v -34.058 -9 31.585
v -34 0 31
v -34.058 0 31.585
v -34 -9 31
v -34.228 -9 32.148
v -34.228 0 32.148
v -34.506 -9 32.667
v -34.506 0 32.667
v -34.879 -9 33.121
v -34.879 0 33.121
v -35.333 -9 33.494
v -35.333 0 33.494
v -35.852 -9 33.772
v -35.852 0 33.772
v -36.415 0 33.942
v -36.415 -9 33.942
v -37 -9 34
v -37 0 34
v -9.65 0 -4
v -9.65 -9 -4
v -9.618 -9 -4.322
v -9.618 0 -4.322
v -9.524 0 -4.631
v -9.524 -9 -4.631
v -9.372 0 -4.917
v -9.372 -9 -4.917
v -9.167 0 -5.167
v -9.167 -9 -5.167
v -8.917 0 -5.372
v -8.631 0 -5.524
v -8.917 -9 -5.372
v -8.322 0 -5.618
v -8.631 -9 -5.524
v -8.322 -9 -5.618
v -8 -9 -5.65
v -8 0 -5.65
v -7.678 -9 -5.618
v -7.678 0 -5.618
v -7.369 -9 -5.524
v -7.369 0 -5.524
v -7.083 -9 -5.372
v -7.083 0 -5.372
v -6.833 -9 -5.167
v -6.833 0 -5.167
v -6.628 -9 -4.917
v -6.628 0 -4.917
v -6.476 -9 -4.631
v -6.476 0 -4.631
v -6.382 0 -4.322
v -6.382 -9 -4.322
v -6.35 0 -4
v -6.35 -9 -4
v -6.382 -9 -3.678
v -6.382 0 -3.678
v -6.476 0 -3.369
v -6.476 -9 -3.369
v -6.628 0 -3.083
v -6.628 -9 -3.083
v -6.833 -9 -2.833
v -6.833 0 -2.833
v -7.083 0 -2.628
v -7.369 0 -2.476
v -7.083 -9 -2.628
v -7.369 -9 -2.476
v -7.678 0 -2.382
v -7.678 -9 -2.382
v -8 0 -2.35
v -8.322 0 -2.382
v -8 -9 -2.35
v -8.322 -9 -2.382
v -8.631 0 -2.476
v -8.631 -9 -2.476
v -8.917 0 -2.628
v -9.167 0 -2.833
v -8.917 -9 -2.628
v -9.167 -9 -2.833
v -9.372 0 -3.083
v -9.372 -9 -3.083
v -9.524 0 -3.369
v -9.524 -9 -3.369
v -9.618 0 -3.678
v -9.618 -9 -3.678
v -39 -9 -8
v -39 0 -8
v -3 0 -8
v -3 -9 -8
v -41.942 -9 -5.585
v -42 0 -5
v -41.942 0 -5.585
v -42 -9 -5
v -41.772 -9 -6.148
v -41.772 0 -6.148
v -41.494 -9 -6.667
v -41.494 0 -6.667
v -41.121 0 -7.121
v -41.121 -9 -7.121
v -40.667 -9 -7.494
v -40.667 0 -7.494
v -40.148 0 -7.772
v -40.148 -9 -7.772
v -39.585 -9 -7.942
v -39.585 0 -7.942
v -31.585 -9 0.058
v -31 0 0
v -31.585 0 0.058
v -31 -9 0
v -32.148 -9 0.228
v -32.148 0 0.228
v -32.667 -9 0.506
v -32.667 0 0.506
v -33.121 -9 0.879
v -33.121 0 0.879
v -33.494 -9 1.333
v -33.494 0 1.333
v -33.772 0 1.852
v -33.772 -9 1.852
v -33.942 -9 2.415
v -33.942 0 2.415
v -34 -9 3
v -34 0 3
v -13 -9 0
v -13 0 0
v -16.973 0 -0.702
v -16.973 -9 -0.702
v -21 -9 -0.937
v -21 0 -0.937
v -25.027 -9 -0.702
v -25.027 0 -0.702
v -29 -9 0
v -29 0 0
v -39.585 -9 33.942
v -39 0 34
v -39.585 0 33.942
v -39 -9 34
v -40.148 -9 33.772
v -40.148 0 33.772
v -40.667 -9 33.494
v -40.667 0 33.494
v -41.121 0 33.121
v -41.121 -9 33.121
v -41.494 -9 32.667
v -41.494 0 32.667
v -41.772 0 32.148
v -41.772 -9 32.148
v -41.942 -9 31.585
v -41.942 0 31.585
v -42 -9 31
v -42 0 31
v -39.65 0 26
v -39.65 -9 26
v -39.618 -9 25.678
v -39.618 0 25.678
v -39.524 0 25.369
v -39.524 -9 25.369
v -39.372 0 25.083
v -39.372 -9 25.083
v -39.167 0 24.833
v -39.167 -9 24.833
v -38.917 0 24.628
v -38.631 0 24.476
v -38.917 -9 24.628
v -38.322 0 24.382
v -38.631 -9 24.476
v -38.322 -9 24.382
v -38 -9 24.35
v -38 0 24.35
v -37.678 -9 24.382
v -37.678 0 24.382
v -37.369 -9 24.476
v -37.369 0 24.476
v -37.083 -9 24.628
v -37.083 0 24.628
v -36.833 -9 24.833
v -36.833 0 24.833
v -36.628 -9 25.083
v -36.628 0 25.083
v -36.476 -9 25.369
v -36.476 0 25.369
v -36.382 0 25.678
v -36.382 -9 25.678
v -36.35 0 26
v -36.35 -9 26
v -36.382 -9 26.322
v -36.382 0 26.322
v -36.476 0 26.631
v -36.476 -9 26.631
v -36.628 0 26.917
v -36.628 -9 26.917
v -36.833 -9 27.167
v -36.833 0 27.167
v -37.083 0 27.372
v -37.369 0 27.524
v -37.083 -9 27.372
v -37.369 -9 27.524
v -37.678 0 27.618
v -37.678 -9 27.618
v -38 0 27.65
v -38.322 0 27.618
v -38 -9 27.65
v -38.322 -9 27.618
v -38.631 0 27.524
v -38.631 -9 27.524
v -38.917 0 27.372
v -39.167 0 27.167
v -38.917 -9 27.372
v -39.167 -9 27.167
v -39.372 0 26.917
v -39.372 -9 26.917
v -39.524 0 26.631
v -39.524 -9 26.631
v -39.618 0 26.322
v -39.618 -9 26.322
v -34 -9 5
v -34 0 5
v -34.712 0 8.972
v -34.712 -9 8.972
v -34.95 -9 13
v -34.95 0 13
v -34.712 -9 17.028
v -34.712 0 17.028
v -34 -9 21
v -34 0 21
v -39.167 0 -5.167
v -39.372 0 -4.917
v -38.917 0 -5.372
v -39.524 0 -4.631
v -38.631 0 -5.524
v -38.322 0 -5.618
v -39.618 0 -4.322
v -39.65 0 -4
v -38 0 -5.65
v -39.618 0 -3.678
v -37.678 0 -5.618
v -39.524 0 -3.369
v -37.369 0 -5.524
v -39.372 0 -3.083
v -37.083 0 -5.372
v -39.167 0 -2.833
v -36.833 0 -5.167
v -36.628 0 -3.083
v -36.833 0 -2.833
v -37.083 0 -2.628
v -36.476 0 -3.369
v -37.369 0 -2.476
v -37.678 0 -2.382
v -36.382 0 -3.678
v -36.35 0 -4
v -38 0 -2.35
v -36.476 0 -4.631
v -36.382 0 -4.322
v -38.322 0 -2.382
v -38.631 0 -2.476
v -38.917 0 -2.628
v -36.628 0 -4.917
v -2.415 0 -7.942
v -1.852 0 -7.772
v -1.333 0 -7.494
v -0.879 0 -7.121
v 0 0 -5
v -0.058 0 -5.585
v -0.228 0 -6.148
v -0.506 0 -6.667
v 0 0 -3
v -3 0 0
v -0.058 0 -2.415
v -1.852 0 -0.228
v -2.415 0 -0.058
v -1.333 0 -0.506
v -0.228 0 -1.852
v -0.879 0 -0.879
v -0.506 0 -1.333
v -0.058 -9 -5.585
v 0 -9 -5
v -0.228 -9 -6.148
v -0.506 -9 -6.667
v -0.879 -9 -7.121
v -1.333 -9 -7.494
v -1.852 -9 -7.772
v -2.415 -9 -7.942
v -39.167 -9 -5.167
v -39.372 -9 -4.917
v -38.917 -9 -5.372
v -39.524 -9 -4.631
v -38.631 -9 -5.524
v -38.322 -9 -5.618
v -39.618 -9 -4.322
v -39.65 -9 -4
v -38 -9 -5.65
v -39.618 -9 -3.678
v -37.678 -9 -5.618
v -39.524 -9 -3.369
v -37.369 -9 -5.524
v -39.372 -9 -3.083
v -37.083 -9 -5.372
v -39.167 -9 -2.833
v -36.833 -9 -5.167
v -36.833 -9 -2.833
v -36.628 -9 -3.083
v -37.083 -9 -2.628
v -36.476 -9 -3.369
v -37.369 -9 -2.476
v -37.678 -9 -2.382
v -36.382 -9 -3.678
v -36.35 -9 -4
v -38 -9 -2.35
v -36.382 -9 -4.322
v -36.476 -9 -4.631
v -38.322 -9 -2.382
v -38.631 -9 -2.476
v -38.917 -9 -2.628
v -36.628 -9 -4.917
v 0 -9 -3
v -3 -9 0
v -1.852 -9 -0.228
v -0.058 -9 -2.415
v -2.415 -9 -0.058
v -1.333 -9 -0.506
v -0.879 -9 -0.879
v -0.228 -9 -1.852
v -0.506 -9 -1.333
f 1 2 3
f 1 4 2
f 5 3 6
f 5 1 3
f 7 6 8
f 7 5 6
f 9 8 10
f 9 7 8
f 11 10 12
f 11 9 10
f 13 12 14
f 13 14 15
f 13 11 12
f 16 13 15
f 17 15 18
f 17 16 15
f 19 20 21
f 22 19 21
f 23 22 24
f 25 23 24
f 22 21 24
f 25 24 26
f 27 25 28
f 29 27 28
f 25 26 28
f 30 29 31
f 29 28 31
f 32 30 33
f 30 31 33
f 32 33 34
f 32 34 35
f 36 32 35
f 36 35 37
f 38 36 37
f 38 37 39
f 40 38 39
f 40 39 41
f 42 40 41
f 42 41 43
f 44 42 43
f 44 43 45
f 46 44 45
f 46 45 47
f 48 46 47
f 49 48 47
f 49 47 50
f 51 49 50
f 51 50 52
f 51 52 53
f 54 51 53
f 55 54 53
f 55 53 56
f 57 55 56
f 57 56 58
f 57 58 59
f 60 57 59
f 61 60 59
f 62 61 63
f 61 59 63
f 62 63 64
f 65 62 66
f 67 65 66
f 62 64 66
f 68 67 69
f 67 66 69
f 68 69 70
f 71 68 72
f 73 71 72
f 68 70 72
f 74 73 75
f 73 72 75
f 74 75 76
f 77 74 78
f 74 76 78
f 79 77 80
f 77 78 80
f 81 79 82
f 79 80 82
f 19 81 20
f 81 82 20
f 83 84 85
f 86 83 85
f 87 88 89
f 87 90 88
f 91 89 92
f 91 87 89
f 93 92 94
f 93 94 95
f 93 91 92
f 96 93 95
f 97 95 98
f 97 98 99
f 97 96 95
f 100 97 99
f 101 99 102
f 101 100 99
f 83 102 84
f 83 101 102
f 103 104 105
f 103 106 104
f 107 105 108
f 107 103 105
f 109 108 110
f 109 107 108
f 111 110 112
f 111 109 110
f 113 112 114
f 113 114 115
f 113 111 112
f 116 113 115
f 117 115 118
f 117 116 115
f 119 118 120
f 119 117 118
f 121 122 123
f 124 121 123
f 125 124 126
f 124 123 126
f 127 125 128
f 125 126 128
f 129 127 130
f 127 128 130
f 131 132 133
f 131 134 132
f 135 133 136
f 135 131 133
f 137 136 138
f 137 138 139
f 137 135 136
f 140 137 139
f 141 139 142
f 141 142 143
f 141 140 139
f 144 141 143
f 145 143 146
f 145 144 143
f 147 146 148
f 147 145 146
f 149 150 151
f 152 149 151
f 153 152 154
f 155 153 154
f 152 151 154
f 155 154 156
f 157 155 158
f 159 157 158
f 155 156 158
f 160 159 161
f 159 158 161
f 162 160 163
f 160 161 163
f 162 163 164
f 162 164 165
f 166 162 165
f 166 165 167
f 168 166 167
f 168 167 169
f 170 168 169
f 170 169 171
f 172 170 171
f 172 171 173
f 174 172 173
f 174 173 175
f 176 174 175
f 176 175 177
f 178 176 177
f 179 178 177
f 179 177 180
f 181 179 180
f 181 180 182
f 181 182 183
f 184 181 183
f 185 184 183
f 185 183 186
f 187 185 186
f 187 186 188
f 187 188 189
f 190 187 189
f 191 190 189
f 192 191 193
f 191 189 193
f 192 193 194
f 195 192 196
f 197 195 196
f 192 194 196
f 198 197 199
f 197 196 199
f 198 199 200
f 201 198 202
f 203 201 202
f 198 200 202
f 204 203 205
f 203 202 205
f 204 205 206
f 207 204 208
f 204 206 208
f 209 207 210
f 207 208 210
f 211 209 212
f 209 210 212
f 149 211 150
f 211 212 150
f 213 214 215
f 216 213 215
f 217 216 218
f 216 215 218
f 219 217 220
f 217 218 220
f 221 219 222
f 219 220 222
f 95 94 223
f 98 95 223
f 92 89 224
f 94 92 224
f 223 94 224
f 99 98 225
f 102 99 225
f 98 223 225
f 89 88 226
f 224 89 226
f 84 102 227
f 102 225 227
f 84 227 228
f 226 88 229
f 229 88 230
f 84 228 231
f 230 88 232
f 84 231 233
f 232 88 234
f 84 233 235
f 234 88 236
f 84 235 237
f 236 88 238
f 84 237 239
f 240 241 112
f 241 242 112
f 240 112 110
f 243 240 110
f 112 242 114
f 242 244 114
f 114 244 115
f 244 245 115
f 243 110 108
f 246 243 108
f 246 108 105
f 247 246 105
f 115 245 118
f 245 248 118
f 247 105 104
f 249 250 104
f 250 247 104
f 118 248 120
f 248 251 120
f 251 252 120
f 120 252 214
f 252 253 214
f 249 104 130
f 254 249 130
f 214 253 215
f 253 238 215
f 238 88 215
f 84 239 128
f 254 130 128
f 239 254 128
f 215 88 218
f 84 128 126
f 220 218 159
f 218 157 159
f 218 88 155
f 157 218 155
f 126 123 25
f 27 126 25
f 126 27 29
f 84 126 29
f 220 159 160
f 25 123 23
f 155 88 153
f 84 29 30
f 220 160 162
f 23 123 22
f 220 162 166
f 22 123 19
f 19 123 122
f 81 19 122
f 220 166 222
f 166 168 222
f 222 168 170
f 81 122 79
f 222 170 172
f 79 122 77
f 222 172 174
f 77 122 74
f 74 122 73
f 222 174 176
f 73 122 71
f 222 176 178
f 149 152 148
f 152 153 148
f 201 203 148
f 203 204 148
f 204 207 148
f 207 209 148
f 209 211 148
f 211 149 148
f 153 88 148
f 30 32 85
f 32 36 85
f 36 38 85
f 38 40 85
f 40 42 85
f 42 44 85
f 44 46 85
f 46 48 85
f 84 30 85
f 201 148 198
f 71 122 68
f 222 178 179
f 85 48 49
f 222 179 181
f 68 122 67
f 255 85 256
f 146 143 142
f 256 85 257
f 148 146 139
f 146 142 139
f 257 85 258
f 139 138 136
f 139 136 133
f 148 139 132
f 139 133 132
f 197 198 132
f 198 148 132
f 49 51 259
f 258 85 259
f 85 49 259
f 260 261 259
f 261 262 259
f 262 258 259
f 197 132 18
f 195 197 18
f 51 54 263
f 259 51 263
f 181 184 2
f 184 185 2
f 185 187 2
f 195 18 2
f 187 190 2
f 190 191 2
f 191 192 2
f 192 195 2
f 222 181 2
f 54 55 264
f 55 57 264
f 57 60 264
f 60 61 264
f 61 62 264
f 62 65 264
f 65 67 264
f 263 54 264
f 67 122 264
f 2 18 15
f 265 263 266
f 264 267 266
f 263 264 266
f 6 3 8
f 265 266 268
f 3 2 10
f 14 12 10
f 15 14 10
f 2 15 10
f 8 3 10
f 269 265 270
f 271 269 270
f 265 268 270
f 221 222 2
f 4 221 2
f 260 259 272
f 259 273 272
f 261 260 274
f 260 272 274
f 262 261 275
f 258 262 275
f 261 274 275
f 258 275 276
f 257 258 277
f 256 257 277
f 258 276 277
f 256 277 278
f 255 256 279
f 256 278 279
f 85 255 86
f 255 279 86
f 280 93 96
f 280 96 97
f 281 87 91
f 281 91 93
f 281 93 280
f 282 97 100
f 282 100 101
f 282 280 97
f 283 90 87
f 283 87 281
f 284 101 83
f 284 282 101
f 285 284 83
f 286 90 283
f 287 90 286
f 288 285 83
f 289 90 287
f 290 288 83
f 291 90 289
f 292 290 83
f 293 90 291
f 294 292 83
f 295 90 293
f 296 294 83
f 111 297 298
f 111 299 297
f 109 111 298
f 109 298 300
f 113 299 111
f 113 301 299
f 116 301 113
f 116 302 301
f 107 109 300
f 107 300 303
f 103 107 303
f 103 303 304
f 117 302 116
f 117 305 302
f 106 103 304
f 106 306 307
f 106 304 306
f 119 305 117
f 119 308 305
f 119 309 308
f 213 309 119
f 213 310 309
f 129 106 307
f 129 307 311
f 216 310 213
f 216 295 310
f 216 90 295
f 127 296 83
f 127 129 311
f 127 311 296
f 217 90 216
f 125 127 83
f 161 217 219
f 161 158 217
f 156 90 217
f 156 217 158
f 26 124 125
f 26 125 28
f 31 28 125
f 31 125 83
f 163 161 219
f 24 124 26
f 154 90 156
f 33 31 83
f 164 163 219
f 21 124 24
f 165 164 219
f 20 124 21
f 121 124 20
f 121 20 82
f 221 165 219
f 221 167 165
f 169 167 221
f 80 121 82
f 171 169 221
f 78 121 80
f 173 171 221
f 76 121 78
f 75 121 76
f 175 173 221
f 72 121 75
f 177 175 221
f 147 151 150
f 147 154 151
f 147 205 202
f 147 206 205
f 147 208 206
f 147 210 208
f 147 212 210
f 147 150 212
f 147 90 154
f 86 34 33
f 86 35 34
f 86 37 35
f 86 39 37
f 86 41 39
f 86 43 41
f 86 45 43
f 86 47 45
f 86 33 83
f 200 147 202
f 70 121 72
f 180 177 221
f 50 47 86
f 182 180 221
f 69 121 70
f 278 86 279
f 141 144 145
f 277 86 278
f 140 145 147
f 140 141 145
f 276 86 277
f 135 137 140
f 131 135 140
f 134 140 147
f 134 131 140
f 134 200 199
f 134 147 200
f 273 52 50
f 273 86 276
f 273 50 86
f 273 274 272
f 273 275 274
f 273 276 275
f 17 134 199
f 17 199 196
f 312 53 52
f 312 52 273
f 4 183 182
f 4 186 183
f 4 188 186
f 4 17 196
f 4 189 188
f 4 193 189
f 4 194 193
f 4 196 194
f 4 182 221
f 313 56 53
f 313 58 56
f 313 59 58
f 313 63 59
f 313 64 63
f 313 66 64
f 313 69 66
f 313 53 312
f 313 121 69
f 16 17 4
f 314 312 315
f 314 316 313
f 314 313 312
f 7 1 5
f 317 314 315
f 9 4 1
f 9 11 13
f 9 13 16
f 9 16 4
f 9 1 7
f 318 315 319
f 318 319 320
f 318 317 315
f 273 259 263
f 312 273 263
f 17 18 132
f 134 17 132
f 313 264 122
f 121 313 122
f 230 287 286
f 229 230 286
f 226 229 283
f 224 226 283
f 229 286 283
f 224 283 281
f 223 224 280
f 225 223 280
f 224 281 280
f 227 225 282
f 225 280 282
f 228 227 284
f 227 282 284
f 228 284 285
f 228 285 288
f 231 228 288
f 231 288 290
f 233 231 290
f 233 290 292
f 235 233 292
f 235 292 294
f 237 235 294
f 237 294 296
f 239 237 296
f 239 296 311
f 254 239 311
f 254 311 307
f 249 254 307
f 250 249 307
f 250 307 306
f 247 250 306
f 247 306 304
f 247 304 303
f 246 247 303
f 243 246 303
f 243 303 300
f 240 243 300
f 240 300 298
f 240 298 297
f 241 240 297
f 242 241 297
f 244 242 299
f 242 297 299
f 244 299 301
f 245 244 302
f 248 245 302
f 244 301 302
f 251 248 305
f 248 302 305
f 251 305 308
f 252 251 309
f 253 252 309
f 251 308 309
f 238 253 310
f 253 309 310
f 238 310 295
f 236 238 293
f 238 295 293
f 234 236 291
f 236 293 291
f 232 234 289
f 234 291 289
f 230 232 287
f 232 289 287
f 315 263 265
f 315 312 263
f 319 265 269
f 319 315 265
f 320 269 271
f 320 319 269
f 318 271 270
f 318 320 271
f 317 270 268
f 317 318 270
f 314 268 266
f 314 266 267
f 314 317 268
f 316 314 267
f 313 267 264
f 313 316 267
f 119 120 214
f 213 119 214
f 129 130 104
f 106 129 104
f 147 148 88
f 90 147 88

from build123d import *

# Parameters (mm, degrees)
F1_DEPTH = 9
F2_R     = 3
F3_D     = 3.3


with BuildPart() as f1:
    # F0 (on Front) → F1 (new body)
    with BuildSketch(Plane.XZ):
        with BuildLine():
            Line((0, -8), (0, 0))
            Line((0, 0), (-13, 0))
            ThreePointArc((-13, 0), (-21, -0.9371725321), (-29, 0))
            Line((-29, 0), (-34, 0))
            Line((-34, 0), (-34, 5))
            ThreePointArc((-34, 5), (-34.9498381987, 13), (-34, 21))
            Line((-34, 21), (-34, 34))
            Line((-34, 34), (-42, 34))
            Line((-42, 34), (-42, 0))
            Line((-42, 0), (-42, -8))
            Line((-42, -8), (0, -8))
        make_face()
    extrude(amount=F1_DEPTH)

    # F2
    f2_edges = [f1.edges().sort_by_distance(p)[0] for p in [
        (-34, -4.5, 34),
        (-42, -4.5, 34),
        (0, -4.5, 0),
        (0, -4.5, -8),
        (-34, -4.5, 0),
        (-42, -4.5, -8),
    ]]
    fillet(f2_edges, radius=F2_R)

    # F3 (through all)
    with Locations(Plane(origin=(0, 0, 0), x_dir=(1, 0, 0), z_dir=(0, 1, 0))):
        with Locations((-38, -26), (-38, 4), (-8, 4)):
            Hole(F3_D / 2)


solid = f1.part
